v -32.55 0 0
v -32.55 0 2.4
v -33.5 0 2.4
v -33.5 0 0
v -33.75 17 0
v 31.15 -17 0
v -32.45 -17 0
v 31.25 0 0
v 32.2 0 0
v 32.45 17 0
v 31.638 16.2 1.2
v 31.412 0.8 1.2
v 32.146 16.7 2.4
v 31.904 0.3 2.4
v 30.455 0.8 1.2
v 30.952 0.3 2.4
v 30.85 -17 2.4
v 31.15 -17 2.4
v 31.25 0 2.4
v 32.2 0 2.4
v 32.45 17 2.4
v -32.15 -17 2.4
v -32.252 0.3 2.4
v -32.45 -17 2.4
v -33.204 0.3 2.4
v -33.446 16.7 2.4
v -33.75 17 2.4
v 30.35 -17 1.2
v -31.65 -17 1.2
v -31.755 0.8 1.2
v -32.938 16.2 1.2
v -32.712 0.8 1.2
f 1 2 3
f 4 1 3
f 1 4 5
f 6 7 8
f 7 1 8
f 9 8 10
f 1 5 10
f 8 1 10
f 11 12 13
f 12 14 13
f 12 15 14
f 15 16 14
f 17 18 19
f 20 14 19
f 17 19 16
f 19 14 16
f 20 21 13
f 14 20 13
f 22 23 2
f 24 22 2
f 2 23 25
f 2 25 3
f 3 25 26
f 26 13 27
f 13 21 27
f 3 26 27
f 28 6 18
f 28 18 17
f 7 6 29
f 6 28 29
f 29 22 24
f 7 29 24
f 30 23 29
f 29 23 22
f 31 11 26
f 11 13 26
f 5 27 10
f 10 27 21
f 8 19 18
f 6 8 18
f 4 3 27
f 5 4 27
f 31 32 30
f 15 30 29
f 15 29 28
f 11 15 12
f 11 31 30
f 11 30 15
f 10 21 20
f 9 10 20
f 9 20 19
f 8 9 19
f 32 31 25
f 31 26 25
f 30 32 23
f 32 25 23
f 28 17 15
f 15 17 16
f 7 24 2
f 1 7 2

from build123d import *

# Parameters (mm, degrees)
PAD_DEPTH = 1.2


with BuildPart() as part:
    # Sketch → Pad (new body)
    with BuildSketch(Plane.XY):
        Polygon((-32.45, -17), (31.15, -17), (31.25, 0), (32.2, 0), (32.45, 17), (-33.75, 17), (-33.5, 0), (-32.55, 0), align=None)
    extrude(amount=PAD_DEPTH)

    # Sketch001 → AdditiveLoft section 0
    with BuildSketch(Plane.XY.offset(1.2)):
        Polygon((32.45, 17), (32.2, 0), (31.25, 0), (31.15, -17), (30.349986, -17), (30.454692, 0.8), (31.411678, 0.8), (31.63815, 16.200086), (-32.93815, 16.200086), (-32.711678, 0.8), (-31.754692, 0.8), (-31.649986, -17), (-32.45, -17), (-32.55, 0), (-33.5, 0), (-33.75, 17), align=None)
    # Sketch002 → AdditiveLoft section 1
    with BuildSketch(Plane.XY.offset(2.4)):
        Polygon((32.45, 17), (32.2, 0), (31.25, 0), (31.15, -17), (30.849995, -17), (30.95176, 0.3), (31.904379, 0.3), (32.145556, 16.700032), (-33.445556, 16.700032), (-33.204379, 0.3), (-32.25176, 0.3), (-32.149995, -17), (-32.45, -17), (-32.55, 0), (-33.5, 0), (-33.75, 17), align=None)
    loft()


solid = part.part
